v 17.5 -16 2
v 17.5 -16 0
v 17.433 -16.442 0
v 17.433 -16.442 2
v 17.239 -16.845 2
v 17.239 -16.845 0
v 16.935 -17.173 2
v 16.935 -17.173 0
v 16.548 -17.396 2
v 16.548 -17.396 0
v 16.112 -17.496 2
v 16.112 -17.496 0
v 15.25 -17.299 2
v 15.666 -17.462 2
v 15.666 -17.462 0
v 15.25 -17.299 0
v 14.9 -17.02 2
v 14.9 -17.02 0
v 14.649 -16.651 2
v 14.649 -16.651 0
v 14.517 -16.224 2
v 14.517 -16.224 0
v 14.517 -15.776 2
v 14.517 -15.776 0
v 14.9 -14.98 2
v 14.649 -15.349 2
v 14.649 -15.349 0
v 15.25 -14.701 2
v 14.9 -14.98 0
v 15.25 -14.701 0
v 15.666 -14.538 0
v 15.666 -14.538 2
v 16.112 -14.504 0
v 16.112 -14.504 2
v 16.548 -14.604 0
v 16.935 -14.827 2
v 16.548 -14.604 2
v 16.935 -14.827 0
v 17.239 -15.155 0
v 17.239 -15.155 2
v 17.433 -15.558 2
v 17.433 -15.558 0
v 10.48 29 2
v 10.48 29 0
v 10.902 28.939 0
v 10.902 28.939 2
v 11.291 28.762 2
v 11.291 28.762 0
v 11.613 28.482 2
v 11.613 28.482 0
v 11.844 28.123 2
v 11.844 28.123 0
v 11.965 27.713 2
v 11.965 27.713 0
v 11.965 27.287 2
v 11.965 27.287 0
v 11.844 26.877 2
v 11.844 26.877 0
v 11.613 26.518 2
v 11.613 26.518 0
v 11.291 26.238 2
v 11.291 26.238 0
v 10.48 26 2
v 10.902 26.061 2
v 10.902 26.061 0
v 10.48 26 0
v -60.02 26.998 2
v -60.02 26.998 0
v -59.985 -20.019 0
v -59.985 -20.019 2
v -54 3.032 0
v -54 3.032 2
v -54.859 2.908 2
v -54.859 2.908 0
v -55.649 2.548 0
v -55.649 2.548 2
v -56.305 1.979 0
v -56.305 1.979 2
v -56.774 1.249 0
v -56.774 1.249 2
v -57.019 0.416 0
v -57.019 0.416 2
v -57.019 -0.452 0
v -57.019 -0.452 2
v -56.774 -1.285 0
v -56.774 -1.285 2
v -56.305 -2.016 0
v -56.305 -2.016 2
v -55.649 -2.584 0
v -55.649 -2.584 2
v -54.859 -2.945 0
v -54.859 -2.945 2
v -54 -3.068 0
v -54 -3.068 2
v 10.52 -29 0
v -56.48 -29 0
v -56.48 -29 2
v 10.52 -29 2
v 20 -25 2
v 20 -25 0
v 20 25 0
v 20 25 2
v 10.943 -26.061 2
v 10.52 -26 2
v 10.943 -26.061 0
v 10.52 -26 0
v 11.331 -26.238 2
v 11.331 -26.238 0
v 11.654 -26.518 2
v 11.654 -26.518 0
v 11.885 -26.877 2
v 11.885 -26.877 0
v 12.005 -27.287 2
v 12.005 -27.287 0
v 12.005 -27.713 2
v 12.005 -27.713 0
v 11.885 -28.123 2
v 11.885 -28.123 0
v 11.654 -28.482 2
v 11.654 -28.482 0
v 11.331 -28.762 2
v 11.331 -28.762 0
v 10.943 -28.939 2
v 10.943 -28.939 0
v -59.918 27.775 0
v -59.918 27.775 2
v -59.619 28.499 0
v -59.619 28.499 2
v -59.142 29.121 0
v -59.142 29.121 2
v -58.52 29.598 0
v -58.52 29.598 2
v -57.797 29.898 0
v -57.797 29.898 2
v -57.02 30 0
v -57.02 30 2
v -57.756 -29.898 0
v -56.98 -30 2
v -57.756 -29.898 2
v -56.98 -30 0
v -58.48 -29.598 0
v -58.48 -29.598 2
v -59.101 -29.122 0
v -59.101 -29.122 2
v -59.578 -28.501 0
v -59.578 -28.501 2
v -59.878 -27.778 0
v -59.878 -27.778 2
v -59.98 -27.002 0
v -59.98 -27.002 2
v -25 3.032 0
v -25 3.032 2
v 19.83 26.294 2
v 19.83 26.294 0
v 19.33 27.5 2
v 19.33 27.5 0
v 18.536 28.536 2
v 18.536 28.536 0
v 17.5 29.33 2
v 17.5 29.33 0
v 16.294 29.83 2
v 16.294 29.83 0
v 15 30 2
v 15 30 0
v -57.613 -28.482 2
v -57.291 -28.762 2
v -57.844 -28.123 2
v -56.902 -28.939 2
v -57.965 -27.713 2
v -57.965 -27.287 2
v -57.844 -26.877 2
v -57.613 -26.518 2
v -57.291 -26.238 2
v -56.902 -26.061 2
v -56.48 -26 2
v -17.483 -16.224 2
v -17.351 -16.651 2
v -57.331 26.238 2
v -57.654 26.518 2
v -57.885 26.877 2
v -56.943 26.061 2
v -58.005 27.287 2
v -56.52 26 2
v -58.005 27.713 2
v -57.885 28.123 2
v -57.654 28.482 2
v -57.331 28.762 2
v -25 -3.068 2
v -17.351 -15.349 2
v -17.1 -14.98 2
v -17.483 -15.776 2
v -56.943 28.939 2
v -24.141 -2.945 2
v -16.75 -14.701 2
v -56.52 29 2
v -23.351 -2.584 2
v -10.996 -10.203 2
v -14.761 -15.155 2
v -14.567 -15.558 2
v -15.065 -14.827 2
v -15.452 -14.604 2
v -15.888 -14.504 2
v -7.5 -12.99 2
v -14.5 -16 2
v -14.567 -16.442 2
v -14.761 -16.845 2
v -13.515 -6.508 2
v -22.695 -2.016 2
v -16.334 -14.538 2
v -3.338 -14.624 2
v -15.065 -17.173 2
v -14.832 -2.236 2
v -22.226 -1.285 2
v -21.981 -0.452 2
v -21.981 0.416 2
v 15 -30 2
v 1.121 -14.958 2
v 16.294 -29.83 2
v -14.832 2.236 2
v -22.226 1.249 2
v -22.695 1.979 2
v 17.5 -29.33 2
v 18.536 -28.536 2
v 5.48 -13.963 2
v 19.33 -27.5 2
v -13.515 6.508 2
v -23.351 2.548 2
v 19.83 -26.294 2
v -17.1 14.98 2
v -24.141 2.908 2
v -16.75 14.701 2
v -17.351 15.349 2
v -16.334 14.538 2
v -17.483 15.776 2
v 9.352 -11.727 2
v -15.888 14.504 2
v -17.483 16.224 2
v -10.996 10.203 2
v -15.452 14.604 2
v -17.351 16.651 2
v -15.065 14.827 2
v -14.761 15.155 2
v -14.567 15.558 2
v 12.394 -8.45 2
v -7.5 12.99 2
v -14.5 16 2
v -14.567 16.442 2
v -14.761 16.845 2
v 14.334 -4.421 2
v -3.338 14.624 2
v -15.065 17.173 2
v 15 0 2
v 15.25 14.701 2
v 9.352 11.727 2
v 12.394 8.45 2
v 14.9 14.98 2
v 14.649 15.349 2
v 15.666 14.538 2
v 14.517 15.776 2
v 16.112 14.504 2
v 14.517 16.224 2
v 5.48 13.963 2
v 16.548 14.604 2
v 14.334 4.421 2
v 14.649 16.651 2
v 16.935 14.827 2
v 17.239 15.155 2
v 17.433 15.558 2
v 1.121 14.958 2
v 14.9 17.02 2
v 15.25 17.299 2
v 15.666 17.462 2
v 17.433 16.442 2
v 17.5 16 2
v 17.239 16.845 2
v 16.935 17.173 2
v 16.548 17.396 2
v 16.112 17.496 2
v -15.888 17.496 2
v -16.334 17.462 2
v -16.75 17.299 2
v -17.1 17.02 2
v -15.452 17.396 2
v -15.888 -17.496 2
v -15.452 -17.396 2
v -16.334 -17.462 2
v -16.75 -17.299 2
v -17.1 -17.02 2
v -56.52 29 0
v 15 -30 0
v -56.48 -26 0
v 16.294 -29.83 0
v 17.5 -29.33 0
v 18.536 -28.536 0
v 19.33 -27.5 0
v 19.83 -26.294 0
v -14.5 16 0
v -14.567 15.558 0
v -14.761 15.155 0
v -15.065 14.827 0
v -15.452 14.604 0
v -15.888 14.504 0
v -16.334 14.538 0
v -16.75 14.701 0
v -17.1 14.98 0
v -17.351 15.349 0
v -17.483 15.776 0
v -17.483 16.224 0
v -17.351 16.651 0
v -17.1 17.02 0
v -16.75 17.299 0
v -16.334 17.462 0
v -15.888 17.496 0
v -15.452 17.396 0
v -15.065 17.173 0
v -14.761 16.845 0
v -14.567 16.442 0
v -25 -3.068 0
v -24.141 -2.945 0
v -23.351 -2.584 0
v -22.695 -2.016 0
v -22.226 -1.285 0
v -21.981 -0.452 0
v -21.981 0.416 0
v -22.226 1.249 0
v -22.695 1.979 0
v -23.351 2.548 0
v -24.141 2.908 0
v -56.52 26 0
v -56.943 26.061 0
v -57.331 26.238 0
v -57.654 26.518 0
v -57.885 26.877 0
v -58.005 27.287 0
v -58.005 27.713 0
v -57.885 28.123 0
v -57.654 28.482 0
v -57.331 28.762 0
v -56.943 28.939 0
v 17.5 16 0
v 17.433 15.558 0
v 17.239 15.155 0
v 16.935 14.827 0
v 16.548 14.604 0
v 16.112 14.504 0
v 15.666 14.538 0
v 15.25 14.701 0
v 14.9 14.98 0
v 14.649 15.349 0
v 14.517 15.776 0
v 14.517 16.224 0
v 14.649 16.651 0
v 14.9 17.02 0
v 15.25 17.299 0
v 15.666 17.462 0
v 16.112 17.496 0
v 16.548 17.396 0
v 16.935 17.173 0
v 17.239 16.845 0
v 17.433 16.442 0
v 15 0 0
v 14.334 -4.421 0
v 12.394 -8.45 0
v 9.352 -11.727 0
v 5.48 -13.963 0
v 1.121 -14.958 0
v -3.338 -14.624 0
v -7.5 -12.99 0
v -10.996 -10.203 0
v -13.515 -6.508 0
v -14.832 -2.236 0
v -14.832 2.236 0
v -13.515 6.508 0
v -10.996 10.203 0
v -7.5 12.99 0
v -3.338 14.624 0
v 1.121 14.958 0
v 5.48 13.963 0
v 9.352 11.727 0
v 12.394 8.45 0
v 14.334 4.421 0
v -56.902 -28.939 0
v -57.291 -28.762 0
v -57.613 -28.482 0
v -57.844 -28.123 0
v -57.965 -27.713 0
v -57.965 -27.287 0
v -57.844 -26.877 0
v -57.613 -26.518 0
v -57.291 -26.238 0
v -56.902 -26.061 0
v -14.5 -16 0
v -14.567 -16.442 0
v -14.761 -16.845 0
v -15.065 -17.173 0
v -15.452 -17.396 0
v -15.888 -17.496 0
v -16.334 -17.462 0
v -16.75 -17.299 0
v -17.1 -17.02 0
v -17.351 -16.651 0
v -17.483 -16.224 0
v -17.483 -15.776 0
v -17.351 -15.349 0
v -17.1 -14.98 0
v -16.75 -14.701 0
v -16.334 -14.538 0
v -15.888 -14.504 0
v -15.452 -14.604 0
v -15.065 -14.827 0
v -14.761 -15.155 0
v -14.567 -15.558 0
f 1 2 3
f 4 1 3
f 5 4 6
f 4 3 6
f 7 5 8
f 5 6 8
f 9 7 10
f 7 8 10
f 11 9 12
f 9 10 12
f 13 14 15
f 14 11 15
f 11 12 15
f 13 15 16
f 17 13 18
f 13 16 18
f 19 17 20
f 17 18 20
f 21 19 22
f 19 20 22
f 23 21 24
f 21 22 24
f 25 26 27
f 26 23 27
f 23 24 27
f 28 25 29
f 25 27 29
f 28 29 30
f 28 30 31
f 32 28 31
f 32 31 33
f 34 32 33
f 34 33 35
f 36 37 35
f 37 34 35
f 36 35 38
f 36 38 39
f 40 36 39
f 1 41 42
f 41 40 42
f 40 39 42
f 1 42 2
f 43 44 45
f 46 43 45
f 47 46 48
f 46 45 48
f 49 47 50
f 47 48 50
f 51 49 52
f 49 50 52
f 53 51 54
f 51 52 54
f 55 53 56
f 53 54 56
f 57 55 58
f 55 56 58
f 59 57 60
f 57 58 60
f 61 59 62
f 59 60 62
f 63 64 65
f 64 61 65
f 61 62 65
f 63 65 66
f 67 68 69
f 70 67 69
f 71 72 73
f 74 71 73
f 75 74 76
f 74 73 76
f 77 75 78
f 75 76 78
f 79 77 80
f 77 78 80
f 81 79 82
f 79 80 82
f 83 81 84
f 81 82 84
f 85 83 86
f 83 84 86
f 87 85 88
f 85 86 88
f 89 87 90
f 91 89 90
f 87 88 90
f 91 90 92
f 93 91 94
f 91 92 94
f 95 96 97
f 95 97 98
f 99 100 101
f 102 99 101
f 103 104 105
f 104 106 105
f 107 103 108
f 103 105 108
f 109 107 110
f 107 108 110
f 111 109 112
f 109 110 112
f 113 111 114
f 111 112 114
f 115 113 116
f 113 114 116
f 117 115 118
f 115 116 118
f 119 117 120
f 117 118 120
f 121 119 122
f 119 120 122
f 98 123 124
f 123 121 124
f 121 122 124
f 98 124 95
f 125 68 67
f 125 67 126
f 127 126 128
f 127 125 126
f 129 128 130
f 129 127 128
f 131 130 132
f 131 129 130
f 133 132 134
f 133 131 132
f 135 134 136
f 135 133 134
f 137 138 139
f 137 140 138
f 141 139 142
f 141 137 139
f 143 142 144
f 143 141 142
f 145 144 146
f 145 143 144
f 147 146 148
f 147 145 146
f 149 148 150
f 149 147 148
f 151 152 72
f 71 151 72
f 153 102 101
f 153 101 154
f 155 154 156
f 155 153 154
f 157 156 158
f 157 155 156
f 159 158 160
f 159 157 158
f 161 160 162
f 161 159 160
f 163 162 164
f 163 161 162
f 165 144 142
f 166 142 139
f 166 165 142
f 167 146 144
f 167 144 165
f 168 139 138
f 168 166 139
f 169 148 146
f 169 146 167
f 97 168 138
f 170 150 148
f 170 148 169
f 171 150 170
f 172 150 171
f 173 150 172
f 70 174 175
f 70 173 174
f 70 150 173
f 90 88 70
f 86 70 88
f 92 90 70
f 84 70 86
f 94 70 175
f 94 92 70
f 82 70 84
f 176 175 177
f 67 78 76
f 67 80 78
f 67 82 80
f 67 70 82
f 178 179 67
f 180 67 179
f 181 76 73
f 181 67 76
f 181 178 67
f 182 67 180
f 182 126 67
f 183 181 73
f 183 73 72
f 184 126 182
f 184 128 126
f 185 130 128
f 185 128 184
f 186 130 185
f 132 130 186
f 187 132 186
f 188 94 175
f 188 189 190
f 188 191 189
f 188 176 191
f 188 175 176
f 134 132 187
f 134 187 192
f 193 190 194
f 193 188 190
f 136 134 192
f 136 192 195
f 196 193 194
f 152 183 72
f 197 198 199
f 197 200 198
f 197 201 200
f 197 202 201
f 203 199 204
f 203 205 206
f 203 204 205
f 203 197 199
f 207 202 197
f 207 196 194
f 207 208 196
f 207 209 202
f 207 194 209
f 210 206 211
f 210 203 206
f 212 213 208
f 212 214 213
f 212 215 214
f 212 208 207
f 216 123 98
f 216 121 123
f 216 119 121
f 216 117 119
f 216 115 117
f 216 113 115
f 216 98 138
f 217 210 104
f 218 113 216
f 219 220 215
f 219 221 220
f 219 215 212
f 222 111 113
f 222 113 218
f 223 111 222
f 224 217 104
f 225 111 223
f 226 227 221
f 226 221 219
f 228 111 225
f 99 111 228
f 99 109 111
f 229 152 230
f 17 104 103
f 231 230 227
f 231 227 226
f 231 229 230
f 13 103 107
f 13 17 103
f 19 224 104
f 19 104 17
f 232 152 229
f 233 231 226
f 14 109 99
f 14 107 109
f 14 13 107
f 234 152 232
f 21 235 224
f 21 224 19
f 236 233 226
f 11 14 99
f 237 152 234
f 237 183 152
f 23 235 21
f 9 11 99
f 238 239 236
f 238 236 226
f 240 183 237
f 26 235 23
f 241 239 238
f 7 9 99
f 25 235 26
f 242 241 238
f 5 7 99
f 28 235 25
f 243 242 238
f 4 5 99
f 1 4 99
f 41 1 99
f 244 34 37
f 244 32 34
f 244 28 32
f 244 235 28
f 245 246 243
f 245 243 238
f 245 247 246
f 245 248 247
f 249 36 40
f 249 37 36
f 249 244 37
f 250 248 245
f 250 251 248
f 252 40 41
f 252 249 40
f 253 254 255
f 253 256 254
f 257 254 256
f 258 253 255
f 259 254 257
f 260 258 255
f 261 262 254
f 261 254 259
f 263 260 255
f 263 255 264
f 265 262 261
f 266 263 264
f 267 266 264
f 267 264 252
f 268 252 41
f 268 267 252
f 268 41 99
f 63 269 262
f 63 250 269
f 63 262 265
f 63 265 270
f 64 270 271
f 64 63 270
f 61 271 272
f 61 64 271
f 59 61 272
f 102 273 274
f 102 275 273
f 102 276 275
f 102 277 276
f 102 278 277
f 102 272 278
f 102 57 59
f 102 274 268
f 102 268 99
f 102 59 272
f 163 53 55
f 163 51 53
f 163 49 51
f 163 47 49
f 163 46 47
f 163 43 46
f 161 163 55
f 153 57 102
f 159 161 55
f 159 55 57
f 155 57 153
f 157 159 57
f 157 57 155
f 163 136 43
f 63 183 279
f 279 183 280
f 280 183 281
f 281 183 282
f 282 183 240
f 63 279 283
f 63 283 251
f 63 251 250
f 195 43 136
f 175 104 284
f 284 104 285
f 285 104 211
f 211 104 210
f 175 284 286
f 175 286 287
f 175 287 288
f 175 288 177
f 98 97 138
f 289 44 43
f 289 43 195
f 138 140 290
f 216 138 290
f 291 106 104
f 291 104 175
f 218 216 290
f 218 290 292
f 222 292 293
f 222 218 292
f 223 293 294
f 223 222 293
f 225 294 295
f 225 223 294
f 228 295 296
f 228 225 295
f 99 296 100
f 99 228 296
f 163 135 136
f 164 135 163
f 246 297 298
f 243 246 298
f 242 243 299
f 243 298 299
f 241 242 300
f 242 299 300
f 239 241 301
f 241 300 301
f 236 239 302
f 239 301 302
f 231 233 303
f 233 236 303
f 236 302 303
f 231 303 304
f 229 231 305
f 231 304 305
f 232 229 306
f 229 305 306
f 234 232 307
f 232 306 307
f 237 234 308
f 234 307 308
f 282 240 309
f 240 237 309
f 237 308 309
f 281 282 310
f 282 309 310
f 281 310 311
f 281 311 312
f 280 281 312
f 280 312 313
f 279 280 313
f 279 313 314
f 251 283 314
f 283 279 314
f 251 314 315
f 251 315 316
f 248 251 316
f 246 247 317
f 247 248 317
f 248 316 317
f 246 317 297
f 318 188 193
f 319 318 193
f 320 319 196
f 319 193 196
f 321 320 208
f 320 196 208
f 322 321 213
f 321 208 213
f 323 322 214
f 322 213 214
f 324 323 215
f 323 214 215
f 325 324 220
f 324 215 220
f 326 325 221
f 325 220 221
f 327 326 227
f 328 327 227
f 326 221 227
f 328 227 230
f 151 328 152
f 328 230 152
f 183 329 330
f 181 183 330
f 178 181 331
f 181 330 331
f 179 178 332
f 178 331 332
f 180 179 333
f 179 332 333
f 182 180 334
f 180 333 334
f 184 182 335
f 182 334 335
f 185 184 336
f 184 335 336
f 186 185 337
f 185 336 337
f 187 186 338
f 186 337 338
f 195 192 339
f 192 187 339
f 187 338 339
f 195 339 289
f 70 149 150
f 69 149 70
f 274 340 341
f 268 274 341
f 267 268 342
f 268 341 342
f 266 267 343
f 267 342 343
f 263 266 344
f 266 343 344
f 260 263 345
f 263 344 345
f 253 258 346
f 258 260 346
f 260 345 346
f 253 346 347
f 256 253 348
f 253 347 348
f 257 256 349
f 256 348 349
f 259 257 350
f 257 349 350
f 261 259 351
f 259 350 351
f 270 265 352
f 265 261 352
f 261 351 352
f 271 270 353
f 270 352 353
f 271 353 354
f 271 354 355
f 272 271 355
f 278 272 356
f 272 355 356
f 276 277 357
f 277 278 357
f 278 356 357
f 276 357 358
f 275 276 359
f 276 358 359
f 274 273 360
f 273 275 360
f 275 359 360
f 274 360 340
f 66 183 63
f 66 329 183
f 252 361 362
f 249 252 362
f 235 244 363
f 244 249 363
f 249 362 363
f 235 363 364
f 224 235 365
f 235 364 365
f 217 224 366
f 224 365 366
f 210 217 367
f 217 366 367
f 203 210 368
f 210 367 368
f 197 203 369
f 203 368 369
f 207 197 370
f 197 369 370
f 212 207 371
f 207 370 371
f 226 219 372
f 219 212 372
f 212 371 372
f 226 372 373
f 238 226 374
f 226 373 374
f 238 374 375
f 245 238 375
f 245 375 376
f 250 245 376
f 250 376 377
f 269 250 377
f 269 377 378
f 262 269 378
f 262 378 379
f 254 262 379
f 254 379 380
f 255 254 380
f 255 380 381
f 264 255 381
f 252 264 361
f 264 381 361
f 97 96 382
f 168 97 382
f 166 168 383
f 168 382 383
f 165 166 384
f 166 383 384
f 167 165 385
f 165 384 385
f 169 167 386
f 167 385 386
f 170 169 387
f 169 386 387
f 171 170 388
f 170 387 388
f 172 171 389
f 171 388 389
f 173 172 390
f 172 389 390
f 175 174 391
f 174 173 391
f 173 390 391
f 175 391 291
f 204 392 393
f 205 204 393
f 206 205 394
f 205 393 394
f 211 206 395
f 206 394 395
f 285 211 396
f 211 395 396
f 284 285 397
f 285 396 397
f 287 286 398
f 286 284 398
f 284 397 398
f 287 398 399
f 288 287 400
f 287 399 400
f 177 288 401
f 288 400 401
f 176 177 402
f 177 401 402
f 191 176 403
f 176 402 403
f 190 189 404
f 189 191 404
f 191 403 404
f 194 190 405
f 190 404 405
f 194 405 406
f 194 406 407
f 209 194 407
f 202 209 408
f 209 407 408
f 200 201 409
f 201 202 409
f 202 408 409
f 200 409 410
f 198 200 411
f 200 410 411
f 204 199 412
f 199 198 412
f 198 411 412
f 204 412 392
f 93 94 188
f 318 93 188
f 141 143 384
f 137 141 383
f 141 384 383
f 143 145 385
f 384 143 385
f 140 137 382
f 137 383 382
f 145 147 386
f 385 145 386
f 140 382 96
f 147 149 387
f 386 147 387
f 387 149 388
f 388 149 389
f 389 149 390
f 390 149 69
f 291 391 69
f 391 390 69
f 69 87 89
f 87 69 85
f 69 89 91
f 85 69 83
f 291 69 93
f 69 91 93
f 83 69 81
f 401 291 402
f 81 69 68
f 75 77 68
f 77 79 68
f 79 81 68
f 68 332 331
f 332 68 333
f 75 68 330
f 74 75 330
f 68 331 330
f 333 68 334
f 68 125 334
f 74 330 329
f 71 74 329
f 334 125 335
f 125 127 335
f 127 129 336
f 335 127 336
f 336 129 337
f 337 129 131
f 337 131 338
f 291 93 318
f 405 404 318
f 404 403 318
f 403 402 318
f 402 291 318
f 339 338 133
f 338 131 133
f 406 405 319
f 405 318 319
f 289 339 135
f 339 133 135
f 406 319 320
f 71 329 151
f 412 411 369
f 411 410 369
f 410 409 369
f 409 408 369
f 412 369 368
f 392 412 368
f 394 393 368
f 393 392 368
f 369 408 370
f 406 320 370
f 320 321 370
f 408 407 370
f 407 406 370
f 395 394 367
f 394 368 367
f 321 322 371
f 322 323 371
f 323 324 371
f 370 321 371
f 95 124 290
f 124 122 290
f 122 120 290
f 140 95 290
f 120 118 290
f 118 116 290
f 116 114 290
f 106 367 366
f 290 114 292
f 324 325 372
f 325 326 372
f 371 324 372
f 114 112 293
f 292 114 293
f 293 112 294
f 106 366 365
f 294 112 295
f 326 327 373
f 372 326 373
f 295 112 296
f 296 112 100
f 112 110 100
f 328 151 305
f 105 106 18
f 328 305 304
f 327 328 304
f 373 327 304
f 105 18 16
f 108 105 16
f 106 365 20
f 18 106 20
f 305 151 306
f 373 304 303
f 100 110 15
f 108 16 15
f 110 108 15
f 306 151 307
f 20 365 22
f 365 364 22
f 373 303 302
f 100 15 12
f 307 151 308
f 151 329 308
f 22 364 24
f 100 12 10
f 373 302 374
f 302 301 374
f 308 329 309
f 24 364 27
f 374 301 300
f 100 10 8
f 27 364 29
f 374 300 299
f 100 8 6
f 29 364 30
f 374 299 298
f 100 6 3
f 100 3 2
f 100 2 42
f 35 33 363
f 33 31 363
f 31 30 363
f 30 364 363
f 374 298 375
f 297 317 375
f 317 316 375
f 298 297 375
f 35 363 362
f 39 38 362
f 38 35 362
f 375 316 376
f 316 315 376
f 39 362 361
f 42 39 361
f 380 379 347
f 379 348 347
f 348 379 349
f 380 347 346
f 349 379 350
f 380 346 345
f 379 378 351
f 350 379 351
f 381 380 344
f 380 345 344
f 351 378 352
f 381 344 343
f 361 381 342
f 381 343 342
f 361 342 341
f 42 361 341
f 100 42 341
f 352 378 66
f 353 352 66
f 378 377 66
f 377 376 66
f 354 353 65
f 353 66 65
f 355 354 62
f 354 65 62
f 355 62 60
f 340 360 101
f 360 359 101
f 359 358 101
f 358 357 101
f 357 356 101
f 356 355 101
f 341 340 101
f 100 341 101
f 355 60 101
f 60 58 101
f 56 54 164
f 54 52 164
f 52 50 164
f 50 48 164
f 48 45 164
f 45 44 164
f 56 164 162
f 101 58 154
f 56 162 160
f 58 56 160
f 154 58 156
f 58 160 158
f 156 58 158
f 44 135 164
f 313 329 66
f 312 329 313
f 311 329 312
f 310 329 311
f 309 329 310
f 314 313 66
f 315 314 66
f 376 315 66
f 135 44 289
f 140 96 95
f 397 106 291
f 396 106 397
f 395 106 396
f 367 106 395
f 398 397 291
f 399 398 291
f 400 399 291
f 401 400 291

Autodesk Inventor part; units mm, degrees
ref_plane "YZ Plane" through (0, 0, 0) normal (1, 0, 0) x (0, 1, 0)
ref_plane "XZ Plane" through (0, 0, 0) normal (0, 1, 0) x (-1, 0, 0)
ref_plane "XY Plane" through (0, 0, 0) normal (0, 0, 1) x (1, 0, 0)
sketch "Sketch1" plane through (0, 0, 0) normal (0, 0, 1) x (1, 0, 0)
  circle A0 centre (0, 0) radius 15 projected
  circle A1 centre (16, 16) radius 1.5 projected
  circle A2 centre (-16, 16) radius 1.5 projected
  circle A3 centre (-16, -16) radius 1.5 projected
  circle A4 centre (16, -16) radius 1.5 projected
  line L0 (20, -18) -> (20, 18) projected
  line L1 (18, 20) -> (-18, 20) projected
  line L2 (-60.0198, 26.9978) -> (-59.9853, -20.0189)
  line L3 (-18, -20) -> (18, -20) projected
  line L4 (-57.0198, 30) -> (-15.022, 30)
  line L5 (-14.978, -30) -> (-56.9802, -30)
  line L6 (-59.9802, -27.0022) -> (-60.0198, 26.9978)
  line L7 (-57.9798, -27.5) -> (12.0202, -27.5) construction
  line L8 (-56.4798, -29) -> (10.5202, -29)
  line L9 (10.5202, -26) -> (-56.4798, -26)
  arc A5 (-56.4798, -26) -> (-56.4798, -29) centre (-56.4798, -27.5) ccw
  arc A6 (10.5202, -29) -> (10.5202, -26) centre (10.5202, -27.5) ccw
  arc A7 (-59.9802, -27.0022) -> (-56.9802, -30) centre (-56.9802, -27) ccw
  arc A8 (-57.0198, 30) -> (-60.0198, 26.9978) centre (-57.0198, 27) ccw
  line L10 (-58.0202, 27.5) -> (11.9798, 27.5) construction
  line L11 (-56.5202, 26) -> (10.4798, 26)
  line L12 (10.4798, 29) -> (-56.5202, 29)
  arc A9 (-56.5202, 29) -> (-56.5202, 26) centre (-56.5202, 27.5) ccw
  arc A10 (10.4798, 26) -> (10.4798, 29) centre (10.4798, 27.5) ccw
  line L13 (20, -18) -> (20, 18)
  line L14 (-14.978, -30) -> (20, -30)
  line L15 (20, -30) -> (20, -18)
  line L16 (20, -30) -> (-56.9802, -30)
  line L17 (-60.0198, -29) -> (-60.0198, 27)
  line L18 (-57.0198, 30) -> (20, 30)
  line L19 (20, 30) -> (20, -30)
  point P0 (0, 0)
  point P1 (-60.0198, 26.9811)
  point P2 (-59.978, -30)
  point P3 (-22.9798, -27.5)
  point P4 (-23.0202, 27.5)
  dimension "d11" = 70
  dimension "d12" = 3
  dimension "d13" = 2.5
  dimension "d15" = 3.5
  dimension "d16" = 3
  dimension "d17" = 3
  dimension "d18" = 3
  dimension "d19" = 70
  dimension "d21" = 3.5
  dimension "d26" = 30
  dimension "d27" = 60
  dimension "d28" = 2.5
  dimension "d29" = 45
  dimension "d30" = 45
  dimension "d31" = 60
  dimension "d32" = 79.9853
  dimension "d33" = 80.0198
extrude "Extrusion1" add sketch "Sketch1" along normal blind 2
fillet "Fillet1" radius 5 2 edges at (20, -30, 1) (20, 30, 1)
sketch "Sketch4" plane through (0, 0, 2) normal (0, 0, 1) x (1, 0, 0)
  line L0 (-21.95, -0.0183) -> (-57.05, -0.0183) construction
  line L1 (-25, 3.0317) -> (-54, 3.0317)
  line L2 (-54, -3.0683) -> (-25, -3.0683)
  arc A0 (-25, -3.0683) -> (-25, 3.0317) centre (-25, -0.0183) ccw
  arc A1 (-54, 3.0317) -> (-54, -3.0683) centre (-54, -0.0183) ccw
  circle A2 centre (0, 0) radius 15 projected
  line L3 (-60.0198, 26.9978) -> (-59.9802, -27.0022) projected
  point P0 (0, 0)
  point P1 (-39.5, -0.0183)
  dimension "d34" = 6.1
  dimension "d35" = 25
  dimension "d36" = 6
extrude "Extrusion2" cut sketch "Sketch4" against normal through all contours A0 L2 A1 L1
equation "\"d18\" = d12"
equation "\"d19\" = d11"
equation "\"d21\" = d15"
equation "\"d26\" = 0.5 * d27"
equation "\"d30\" = d29"
properties part number "X-motor-holder-offset"
